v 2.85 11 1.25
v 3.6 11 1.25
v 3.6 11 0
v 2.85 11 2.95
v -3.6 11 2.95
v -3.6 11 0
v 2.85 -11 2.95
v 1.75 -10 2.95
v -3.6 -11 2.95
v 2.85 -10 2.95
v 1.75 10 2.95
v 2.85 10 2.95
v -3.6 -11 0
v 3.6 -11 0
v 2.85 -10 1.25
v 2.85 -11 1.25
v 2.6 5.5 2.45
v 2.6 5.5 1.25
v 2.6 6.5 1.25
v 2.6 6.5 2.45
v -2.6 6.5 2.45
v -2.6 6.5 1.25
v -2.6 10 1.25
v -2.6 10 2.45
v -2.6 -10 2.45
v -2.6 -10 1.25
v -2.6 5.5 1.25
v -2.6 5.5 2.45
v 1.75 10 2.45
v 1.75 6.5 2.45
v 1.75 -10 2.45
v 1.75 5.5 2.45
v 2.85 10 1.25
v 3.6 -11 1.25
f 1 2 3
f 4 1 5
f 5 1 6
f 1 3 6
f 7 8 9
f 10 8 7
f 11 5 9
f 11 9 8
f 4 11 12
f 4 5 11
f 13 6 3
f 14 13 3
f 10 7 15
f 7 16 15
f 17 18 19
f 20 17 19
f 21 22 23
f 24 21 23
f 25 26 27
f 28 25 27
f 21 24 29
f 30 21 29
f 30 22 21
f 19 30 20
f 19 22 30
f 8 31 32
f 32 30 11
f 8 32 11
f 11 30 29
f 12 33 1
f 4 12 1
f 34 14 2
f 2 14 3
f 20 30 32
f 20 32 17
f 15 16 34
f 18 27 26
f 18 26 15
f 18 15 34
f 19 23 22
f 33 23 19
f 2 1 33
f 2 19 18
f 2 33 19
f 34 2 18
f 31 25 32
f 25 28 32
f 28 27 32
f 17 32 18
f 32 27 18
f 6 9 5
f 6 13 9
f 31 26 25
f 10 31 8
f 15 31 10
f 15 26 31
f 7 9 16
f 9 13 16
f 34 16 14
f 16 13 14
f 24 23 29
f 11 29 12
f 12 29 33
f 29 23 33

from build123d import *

# Parameters (mm, degrees)
SKETCH009_W   = 7.2
SKETCH009_H   = 22
PAD006_DEPTH  = 1.25
SKETCH010_W   = 1
SKETCH010_H   = 22
SKETCH010_W_2 = 5.45
SKETCH010_H_2 = 1
SKETCH010_W_3 = 5.2
PAD007_DEPTH  = 1.2
SKETCH011_W   = 5.35
SKETCH011_H   = 22
SKETCH011_W_2 = 1.1
SKETCH011_H_2 = 1
PAD008_DEPTH  = 0.5


with BuildPart() as part:
    # Sketch009 → Pad006 (new body)
    with BuildSketch(Plane.XY):
        Rectangle(SKETCH009_W, SKETCH009_H)
    extrude(amount=PAD006_DEPTH)

    # Sketch010 (on Face6 of Pad006) → Pad007 (join)
    with BuildSketch(Plane.XY.offset(1.25)):
        with Locations((-3.1, 0)):
            Rectangle(SKETCH010_W, SKETCH010_H)
        with Locations((0.125, 10.5)):
            Rectangle(SKETCH010_W_2, SKETCH010_H_2)
        with Locations((0, 6)):
            Rectangle(SKETCH010_W_3, SKETCH010_H_2)
        with Locations((0.125, -10.5)):
            Rectangle(SKETCH010_W_2, SKETCH010_H_2)
    extrude(amount=PAD007_DEPTH)

    # Sketch011 (on Face16 of Pad007) → Pad008 (join)
    with BuildSketch(Plane.XY.offset(2.45)):
        with Locations((-0.925, 0)):
            Rectangle(SKETCH011_W, SKETCH011_H)
        with Locations((2.3, -10.5)):
            Rectangle(SKETCH011_W_2, SKETCH011_H_2)
        with Locations((2.3, 10.5)):
            Rectangle(SKETCH011_W_2, SKETCH011_H_2)
    extrude(amount=PAD008_DEPTH)


solid = part.part
